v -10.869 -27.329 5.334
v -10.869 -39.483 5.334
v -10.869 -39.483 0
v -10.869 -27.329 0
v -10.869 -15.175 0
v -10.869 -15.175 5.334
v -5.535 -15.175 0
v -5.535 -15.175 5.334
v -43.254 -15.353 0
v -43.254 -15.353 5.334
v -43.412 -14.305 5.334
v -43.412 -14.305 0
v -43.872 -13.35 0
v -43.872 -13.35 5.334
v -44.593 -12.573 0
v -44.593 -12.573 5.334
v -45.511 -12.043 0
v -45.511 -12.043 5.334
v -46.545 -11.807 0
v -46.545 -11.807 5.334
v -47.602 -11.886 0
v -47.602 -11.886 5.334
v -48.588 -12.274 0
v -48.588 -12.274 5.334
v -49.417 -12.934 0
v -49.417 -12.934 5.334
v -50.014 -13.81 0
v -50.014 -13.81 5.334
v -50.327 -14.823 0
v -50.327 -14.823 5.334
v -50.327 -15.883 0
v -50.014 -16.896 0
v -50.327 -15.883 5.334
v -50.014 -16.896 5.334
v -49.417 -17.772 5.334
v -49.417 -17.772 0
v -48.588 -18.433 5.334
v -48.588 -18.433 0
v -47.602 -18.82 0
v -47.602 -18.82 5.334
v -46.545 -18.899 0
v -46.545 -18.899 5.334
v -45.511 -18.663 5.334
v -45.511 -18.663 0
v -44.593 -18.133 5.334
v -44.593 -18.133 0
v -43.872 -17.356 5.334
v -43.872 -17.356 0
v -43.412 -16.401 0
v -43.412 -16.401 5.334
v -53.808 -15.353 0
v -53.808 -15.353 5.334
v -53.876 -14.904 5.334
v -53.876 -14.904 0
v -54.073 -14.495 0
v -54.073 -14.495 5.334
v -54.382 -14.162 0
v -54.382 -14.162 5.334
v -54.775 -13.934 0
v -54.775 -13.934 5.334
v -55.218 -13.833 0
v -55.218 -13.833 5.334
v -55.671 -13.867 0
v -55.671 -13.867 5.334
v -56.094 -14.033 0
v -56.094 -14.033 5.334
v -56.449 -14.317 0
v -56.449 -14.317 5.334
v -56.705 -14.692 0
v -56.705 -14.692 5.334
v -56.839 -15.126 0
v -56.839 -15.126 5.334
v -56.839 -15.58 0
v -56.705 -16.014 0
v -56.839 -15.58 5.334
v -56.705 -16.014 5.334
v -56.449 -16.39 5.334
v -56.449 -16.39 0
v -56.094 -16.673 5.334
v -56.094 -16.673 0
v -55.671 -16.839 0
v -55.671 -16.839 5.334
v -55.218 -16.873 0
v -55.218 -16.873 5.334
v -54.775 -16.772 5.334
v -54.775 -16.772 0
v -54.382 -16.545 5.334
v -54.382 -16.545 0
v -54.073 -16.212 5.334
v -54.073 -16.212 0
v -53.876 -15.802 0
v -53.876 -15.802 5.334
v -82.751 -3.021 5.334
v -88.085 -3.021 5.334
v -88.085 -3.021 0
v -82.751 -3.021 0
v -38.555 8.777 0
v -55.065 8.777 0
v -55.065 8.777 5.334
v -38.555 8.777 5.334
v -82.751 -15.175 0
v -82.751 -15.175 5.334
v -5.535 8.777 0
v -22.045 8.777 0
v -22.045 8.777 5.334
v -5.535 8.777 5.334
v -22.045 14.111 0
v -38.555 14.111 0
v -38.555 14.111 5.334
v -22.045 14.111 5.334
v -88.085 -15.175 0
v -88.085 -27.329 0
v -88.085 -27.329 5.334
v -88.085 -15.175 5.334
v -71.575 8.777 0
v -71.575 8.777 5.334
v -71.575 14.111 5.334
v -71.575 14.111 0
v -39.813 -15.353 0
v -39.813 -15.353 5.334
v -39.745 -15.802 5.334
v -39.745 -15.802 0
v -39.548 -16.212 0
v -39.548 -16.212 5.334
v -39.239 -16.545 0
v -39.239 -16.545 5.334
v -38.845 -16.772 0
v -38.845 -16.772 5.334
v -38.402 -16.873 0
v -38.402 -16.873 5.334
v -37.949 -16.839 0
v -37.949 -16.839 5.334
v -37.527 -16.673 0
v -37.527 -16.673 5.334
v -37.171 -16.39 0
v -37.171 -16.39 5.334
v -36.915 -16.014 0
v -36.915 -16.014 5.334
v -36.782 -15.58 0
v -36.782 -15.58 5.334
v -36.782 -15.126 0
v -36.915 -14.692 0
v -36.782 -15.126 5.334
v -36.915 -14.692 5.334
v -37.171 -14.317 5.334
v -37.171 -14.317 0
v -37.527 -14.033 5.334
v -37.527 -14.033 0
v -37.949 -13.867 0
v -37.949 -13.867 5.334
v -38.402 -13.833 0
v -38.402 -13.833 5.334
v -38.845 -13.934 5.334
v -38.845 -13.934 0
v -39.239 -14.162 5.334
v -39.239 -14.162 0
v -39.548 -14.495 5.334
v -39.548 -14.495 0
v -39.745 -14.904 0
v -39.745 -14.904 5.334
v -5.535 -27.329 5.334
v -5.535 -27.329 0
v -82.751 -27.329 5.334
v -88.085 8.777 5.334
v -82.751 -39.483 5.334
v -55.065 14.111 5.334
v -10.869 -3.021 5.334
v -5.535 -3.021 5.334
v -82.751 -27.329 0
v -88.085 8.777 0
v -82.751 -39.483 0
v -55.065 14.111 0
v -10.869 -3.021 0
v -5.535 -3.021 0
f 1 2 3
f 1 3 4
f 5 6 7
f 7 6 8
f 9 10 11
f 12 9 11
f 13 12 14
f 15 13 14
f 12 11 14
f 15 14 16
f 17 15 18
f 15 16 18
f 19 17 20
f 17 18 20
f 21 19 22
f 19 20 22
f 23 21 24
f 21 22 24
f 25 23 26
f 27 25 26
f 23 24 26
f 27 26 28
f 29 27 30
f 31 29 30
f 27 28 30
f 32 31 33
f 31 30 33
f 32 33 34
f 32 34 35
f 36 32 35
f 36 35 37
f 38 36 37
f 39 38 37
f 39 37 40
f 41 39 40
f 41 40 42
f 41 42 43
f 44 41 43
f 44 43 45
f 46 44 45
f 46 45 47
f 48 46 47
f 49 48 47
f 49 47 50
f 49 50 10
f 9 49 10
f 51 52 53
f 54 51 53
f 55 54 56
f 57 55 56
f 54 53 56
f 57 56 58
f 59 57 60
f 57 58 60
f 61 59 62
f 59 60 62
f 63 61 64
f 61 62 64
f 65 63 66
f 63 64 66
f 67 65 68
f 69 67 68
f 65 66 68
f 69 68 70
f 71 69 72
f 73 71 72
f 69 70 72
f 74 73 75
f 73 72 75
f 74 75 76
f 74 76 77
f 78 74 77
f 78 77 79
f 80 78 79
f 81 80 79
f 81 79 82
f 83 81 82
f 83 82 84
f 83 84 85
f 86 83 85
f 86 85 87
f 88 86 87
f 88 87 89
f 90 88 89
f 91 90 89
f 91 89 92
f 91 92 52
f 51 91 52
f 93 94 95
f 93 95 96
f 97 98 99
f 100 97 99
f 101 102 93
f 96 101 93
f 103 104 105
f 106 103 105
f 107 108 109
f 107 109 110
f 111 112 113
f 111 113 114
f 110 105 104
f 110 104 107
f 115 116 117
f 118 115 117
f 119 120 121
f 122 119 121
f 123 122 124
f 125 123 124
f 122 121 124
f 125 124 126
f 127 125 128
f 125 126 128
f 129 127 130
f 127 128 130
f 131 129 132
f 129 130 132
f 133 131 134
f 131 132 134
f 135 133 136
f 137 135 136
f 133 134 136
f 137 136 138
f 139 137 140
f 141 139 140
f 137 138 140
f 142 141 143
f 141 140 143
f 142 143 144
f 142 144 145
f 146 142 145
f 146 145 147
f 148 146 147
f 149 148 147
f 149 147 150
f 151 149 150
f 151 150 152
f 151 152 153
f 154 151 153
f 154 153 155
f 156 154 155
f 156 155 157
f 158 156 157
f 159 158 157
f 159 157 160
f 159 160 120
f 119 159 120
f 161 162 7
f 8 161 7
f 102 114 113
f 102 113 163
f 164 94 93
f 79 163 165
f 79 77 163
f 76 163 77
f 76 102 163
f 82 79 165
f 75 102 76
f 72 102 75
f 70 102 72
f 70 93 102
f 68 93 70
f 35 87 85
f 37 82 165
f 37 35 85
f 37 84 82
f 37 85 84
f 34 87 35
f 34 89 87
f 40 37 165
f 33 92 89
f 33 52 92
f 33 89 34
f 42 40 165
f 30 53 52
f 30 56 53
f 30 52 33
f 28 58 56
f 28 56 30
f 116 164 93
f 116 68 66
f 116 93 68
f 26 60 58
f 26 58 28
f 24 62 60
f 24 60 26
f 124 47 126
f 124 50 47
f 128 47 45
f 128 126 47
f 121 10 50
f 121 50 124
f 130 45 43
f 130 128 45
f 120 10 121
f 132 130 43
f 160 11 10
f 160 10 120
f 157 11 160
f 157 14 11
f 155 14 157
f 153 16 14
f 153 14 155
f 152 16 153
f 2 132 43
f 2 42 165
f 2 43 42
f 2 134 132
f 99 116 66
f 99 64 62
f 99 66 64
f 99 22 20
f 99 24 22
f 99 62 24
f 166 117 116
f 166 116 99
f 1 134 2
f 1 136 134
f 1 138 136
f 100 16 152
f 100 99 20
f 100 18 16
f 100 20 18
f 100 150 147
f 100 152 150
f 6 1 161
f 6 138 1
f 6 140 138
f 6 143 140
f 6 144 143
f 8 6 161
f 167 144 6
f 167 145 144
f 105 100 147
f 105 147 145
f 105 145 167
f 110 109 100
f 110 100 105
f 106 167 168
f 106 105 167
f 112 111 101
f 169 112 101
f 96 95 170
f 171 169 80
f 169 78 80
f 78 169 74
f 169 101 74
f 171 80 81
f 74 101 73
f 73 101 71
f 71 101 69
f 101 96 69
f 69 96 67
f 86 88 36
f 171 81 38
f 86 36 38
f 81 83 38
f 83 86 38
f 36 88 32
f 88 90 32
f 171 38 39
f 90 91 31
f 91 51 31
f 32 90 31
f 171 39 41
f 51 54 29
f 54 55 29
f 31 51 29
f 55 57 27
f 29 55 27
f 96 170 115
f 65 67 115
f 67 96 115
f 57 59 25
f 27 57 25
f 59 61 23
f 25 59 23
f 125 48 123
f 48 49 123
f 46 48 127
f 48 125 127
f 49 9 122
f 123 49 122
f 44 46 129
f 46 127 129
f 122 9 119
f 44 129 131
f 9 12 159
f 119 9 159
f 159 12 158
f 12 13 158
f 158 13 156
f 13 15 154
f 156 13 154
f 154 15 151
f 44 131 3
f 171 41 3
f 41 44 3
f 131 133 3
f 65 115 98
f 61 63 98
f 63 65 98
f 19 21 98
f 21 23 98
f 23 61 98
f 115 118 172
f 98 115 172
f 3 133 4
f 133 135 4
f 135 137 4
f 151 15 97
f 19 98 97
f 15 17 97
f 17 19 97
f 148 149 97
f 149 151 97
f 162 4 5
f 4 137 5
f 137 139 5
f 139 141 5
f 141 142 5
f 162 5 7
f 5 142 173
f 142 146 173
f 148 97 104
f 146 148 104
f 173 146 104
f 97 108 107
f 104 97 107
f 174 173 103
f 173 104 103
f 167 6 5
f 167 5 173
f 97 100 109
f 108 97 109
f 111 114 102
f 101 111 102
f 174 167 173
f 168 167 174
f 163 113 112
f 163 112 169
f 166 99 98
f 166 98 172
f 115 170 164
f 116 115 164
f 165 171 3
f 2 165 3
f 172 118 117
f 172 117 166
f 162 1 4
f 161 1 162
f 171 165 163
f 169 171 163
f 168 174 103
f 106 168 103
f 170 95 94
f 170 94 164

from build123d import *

# Parameters (mm, degrees)
SKETCH1_W                = 82.55
SKETCH1_H                = 53.594
BOSS_EXTRUDE1_DEPTH      = 5.334
CUT_EXTRUDE1_START       = -88.085249325
CUT_EXTRUDE1_OUTLINE_W   = 5.334
CUT_EXTRUDE1_OUTLINE_H   = 5.334
CUT_EXTRUDE1_DEPTH       = 16.51
CUT_EXTRUDE1_START_2     = -55.065249325
CUT_EXTRUDE1_2_OUTLINE_W = 5.334
CUT_EXTRUDE1_2_OUTLINE_H = 5.334
CUT_EXTRUDE1_2_DEPTH     = 16.51
CUT_EXTRUDE1_START_3     = -22.045249325
CUT_EXTRUDE1_3_OUTLINE_W = 5.334
CUT_EXTRUDE1_3_OUTLINE_H = 5.334
CUT_EXTRUDE1_3_DEPTH     = 16.51
SKETCH3_W                = 5.334
SKETCH3_H                = 12.154056038
CUT_EXTRUDE2_DEPTH       = 97.676684204
SKETCH4_R                = 3.556
SKETCH4_R_2              = 1.524
CUT_EXTRUDE3_DEPTH       = 97.676684204


# Read off the part's stored shape, not the designer's step: Cut-Extrude1
with BuildPart() as part:
    # Sketch1 → Boss-Extrude1 (new body)
    with BuildSketch(Plane.XY):
        with Locations((-46.810249325, -12.686142782)):
            Rectangle(SKETCH1_W, SKETCH1_H)
    extrude(amount=BOSS_EXTRUDE1_DEPTH)

    # Cut-Extrude1 outline → Cut-Extrude1 (cut)
    with BuildSketch(Plane.YZ.offset(CUT_EXTRUDE1_START)):
        with Locations((11.443857218, 2.667)):
            Rectangle(CUT_EXTRUDE1_OUTLINE_W, CUT_EXTRUDE1_OUTLINE_H)
    extrude(amount=CUT_EXTRUDE1_DEPTH, mode=Mode.SUBTRACT)

    # Cut-Extrude1 2 outline → Cut-Extrude1 2 (cut)
    with BuildSketch(Plane.YZ.offset(CUT_EXTRUDE1_START_2)):
        with Locations((11.443857218, 2.667)):
            Rectangle(CUT_EXTRUDE1_2_OUTLINE_W, CUT_EXTRUDE1_2_OUTLINE_H)
    extrude(amount=CUT_EXTRUDE1_2_DEPTH, mode=Mode.SUBTRACT)

    # Cut-Extrude1 3 outline → Cut-Extrude1 3 (cut)
    with BuildSketch(Plane.YZ.offset(CUT_EXTRUDE1_START_3)):
        with Locations((11.443857218, 2.667)):
            Rectangle(CUT_EXTRUDE1_3_OUTLINE_W, CUT_EXTRUDE1_3_OUTLINE_H)
    extrude(amount=CUT_EXTRUDE1_3_DEPTH, mode=Mode.SUBTRACT)

    # Sketch3 → Cut-Extrude2 (cut, through all)
    with BuildSketch(Plane.XY.offset(5.334)):
        with Locations((-85.418249325, -33.406114763)):
            Rectangle(SKETCH3_W, SKETCH3_H)
        with Locations((-85.418249325, -9.098002686)):
            Rectangle(SKETCH3_W, SKETCH3_H)
        with Locations((-8.202249325, -33.406114763)):
            Rectangle(SKETCH3_W, SKETCH3_H)
        with Locations((-8.202249325, -9.098002686)):
            Rectangle(SKETCH3_W, SKETCH3_H)
    extrude(amount=-CUT_EXTRUDE2_DEPTH, mode=Mode.SUBTRACT)

    # Sketch4 → Cut-Extrude3 (cut, through all)
    with BuildSketch(Plane.XY.offset(5.334)):
        with Locations((-46.810249325, -15.353142782)):
            Circle(SKETCH4_R)
        with Locations((-55.331949325, -15.353142782)):
            Circle(SKETCH4_R_2)
        with Locations(Location((-38.288549325, -15.353142782, 0), (0, 0, 180))):
            Circle(SKETCH4_R_2)
    extrude(amount=-CUT_EXTRUDE3_DEPTH, mode=Mode.SUBTRACT)


solid = part.part
